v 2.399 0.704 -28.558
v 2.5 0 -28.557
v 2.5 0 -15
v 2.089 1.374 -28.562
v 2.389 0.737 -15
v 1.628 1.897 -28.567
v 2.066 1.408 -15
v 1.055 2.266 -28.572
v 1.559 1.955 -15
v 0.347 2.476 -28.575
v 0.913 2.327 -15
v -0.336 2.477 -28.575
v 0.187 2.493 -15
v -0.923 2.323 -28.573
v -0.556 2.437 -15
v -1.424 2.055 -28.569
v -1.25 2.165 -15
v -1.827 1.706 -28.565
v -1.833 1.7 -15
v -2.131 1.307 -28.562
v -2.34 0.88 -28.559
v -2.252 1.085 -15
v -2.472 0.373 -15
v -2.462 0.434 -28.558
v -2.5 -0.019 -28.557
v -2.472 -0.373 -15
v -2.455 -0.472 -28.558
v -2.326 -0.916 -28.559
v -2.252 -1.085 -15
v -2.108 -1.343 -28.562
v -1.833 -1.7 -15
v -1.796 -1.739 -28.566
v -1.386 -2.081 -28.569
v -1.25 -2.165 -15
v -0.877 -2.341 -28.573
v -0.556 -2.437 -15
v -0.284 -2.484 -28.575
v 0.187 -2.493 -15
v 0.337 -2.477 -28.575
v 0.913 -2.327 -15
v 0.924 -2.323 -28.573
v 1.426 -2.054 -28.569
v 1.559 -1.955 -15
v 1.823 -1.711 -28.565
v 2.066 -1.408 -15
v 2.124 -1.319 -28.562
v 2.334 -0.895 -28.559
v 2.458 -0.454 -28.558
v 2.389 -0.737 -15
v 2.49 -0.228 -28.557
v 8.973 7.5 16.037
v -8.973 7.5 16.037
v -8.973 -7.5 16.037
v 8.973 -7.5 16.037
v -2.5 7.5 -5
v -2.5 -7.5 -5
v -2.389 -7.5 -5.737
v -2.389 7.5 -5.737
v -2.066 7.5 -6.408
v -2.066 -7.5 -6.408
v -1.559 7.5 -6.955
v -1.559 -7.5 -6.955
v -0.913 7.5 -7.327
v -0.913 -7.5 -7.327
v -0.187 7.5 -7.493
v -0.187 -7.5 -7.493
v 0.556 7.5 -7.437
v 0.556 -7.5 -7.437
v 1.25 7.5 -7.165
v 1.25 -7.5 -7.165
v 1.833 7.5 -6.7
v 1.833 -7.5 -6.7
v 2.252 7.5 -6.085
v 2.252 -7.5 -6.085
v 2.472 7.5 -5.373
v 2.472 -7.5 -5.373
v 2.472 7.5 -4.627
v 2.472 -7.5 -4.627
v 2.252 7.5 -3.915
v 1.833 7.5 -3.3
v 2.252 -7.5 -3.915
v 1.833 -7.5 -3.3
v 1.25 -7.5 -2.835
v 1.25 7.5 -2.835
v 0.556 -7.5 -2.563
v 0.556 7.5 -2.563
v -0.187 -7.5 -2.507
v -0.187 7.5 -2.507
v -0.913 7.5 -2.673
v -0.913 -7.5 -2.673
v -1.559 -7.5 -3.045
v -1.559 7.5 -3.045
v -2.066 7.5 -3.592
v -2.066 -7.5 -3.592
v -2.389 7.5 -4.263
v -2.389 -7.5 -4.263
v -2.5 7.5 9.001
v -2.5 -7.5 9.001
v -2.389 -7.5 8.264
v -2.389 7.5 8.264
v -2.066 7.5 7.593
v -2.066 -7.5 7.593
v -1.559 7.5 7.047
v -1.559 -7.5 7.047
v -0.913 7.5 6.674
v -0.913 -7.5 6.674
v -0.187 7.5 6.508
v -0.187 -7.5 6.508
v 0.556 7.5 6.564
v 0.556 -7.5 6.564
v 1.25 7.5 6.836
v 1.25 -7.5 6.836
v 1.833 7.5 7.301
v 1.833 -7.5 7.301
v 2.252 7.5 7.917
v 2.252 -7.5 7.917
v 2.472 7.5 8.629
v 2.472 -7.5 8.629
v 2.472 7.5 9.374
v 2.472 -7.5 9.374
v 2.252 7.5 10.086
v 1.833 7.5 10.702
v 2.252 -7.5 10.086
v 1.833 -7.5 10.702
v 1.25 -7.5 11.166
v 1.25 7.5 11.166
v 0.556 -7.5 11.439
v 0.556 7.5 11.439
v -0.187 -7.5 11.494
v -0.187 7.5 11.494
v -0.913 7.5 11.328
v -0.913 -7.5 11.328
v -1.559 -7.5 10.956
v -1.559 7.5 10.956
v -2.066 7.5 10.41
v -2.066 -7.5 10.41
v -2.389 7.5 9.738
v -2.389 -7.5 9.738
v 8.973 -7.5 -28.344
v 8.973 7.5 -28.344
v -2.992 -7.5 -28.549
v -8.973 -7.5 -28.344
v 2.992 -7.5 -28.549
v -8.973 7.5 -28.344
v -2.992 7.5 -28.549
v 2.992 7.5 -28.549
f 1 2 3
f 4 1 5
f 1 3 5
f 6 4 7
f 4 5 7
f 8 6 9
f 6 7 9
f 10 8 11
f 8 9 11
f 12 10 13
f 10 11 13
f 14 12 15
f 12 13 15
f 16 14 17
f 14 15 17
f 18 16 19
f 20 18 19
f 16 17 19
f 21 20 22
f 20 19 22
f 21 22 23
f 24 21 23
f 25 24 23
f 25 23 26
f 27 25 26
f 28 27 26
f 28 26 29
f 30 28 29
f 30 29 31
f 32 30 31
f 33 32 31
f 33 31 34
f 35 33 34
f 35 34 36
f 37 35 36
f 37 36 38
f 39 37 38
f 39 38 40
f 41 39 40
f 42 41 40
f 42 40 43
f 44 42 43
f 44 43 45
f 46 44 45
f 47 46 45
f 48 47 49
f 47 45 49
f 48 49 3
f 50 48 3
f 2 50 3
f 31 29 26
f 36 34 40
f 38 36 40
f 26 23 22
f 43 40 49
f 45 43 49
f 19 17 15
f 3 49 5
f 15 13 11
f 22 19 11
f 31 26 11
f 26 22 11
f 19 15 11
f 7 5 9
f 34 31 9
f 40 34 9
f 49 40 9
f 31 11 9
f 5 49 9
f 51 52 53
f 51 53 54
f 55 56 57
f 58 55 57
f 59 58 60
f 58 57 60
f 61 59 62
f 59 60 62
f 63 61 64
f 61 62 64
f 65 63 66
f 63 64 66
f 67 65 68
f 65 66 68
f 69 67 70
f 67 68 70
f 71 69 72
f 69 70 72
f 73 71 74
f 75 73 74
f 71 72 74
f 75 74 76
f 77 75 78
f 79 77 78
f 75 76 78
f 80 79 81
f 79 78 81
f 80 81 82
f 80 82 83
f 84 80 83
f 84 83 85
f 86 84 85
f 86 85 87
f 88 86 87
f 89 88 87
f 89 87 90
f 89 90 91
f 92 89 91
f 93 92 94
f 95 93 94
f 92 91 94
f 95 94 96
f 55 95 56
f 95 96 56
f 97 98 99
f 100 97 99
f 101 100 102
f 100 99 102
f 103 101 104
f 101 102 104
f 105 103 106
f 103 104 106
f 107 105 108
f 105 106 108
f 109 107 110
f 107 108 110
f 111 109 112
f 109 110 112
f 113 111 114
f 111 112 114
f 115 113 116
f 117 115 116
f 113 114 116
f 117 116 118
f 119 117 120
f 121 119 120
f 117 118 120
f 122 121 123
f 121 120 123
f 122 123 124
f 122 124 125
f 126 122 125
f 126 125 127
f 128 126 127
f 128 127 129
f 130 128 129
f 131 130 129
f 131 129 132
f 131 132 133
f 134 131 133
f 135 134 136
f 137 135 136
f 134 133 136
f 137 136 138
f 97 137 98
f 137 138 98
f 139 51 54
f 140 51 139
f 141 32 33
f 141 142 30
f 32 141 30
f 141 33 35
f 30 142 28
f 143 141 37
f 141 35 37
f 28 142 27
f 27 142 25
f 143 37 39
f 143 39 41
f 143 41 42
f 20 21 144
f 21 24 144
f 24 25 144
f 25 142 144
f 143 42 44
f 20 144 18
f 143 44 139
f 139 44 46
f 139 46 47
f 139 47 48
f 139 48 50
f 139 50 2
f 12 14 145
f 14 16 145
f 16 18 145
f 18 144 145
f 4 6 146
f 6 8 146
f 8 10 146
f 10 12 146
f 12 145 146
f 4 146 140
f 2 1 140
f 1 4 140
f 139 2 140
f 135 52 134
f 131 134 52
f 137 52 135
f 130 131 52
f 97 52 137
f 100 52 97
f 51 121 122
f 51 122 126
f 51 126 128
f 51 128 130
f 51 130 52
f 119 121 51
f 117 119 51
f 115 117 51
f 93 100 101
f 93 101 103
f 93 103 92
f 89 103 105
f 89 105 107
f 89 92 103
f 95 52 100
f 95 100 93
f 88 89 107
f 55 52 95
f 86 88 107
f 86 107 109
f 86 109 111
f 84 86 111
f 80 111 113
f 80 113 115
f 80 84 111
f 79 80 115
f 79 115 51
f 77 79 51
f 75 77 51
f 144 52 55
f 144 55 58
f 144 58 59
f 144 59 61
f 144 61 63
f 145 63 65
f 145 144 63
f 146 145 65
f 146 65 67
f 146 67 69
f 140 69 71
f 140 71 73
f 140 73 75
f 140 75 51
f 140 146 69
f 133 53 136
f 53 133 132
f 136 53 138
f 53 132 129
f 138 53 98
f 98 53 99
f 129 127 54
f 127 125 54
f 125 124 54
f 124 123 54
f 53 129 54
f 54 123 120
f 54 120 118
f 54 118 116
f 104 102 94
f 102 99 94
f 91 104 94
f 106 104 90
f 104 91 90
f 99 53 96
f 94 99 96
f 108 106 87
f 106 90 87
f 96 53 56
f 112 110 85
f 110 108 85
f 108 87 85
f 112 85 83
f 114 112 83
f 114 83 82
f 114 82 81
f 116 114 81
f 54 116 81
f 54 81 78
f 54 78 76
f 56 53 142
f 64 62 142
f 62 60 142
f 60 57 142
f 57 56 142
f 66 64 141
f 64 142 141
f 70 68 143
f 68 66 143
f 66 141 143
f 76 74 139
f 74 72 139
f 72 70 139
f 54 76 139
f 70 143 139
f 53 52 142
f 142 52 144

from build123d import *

# Parameters (mm, degrees)
BOSS_EXTRUDE1_DEPTH   = 7.5
M6X1_0_TAPPED_HOLE1_D = 5
SKETCH6_W             = 17.945345232
SKETCH6_H             = 44.380970223
SKETCH6_R             = 2.5
BOSS_EXTRUDE2_DEPTH   = 15
CUT_EXTRUDE1_START    = -15
SKETCH8_R             = 2.5
CUT_EXTRUDE1_DEPTH    = 20


with BuildPart() as part:
    # Sketch1 → Boss-Extrude1 (new, symmetric)
    with BuildSketch(Plane(origin=(0, 0, 0), x_dir=(1, 0, 0), z_dir=(0, 1, 0))):
        with BuildLine():
            Line((-7.5, -0.193392624), (-8.972672616, 28.343633506))
            ThreePointArc((-8.972672616, 28.343633506), (0, 28.575), (8.972672616, 28.343633506))
            Line((8.972672616, 28.343633506), (7.5, -0.193392624))
            Line((7.5, -0.193392624), (7.026752085, -9.363854534))
            ThreePointArc((7.026752085, -9.363854534), (0, -16.037336717), (-7.026752085, -9.363854534))
            Line((-7.026752085, -9.363854534), (-7.5, -0.193392624))
        make_face()
    extrude(amount=BOSS_EXTRUDE1_DEPTH, both=True)

    # M6x1.0 Tapped Hole1 (through all)
    with Locations(Plane(origin=(0, 7.5, 0), x_dir=(1, 0, 0), z_dir=(0, 1, 0))):
        with Locations((0, -9.00123422), (0, 5)):
            Hole(M6X1_0_TAPPED_HOLE1_D / 2)

    # Sketch6 → Boss-Extrude2 (add, through all)
    with BuildSketch(Plane(origin=(0, 7.5, 0), x_dir=(1, 0, 0), z_dir=(0, 1, 0))):
        with Locations((0, 6.153148395)):
            Rectangle(SKETCH6_W, SKETCH6_H)
        with Locations(Location((0, -9.00123422, 0), (0, 0, 270))):
            Circle(SKETCH6_R, mode=Mode.SUBTRACT)
        with Locations(Location((0, 5, 0), (0, 0, 270))):
            Circle(SKETCH6_R, mode=Mode.SUBTRACT)
    extrude(amount=-BOSS_EXTRUDE2_DEPTH)

    # Sketch8 → Cut-Extrude1 (cut)
    with BuildSketch(Plane.XY.offset(CUT_EXTRUDE1_START)):
        Circle(SKETCH8_R)
    extrude(amount=-CUT_EXTRUDE1_DEPTH, mode=Mode.SUBTRACT)


solid = part.part
